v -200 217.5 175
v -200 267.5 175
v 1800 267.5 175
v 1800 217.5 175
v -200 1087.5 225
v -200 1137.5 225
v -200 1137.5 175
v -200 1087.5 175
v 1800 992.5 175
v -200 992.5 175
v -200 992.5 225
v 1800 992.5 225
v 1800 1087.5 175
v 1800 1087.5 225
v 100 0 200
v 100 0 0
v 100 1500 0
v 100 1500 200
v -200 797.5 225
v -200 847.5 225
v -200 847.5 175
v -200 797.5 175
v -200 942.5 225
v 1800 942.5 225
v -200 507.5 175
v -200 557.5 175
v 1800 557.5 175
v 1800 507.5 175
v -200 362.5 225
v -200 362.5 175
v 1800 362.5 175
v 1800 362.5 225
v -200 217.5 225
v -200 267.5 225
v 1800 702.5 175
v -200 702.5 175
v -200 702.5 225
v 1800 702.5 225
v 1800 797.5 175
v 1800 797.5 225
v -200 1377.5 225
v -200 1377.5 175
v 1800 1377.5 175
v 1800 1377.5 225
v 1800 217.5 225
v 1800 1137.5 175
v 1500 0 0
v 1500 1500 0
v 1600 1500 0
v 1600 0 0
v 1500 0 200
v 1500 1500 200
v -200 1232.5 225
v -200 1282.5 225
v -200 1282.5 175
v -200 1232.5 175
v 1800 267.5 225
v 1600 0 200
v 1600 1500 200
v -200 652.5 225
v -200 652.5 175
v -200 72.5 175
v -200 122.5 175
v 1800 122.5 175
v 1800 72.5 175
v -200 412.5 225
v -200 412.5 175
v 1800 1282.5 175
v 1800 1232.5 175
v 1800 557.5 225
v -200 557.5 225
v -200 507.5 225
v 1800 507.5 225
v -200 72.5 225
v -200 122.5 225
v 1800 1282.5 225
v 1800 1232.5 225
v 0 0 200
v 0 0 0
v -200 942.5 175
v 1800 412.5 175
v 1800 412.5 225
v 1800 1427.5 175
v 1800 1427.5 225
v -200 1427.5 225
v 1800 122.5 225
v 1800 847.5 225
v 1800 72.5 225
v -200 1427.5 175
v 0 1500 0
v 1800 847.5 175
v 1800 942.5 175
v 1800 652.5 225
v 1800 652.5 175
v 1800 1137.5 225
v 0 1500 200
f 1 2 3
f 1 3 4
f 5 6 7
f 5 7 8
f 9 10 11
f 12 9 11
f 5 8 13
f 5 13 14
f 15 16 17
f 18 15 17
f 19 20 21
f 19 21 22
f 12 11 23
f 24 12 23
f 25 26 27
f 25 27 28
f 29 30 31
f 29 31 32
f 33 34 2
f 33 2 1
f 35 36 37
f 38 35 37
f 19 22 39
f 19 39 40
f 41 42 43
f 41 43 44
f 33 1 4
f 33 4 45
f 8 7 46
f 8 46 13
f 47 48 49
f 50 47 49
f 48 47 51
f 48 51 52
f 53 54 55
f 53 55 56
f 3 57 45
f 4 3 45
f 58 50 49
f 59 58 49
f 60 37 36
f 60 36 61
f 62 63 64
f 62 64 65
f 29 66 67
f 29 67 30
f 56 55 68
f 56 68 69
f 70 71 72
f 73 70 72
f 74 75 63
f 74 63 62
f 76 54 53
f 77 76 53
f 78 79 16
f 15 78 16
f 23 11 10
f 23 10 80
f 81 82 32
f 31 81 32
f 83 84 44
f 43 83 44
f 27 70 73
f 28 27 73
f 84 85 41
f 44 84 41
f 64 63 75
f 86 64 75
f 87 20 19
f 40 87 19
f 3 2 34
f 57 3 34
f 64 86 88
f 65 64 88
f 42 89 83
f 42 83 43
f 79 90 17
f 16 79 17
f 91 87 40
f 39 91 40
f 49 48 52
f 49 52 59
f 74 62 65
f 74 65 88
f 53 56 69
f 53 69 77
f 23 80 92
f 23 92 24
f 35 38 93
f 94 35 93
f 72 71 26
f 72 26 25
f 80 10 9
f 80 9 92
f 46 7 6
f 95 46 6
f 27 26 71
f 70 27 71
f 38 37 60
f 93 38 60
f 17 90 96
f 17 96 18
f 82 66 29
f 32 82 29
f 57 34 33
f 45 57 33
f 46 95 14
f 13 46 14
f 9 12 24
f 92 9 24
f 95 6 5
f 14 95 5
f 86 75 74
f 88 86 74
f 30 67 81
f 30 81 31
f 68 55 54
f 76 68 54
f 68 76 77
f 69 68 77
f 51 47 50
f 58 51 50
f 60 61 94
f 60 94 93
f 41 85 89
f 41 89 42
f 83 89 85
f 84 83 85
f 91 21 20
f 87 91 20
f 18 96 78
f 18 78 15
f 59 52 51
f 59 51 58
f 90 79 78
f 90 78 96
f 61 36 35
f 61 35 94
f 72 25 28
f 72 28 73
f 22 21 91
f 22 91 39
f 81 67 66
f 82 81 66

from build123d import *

# Parameters (mm, degrees)
F0_W     = 100
F0_H     = 1500
F1_DEPTH = 200
F3_W     = 50
F3_H     = 50
F4_DEPTH = 2000


with BuildPart() as f1:
    # F0 (on Top) → F1 (new body)
    with BuildSketch(Plane.XY):
        with Locations((50, 750)):
            Rectangle(F0_W, F0_H)
    extrude(amount=F1_DEPTH)


with BuildPart() as f1b:
    # F0 (on Top) → F1, piece 2 (new body)
    with BuildSketch(Plane.XY):
        with Locations((1550, 750)):
            Rectangle(F0_W, F0_H)
    extrude(amount=F1_DEPTH)


with BuildPart() as f4:
    # F3 (on offset) → F4 (new body)
    with BuildSketch(Plane(origin=(-200, 0, 0), x_dir=(0, -1, 0), z_dir=(-1, 0, 0))):
        with Locations((-1402.5, 200)):
            Rectangle(F3_W, F3_H)
    extrude(amount=-F4_DEPTH)


with BuildPart() as f4b:
    # F3 (on offset) → F4, piece 2 (new body)
    with BuildSketch(Plane(origin=(-200, 0, 0), x_dir=(0, -1, 0), z_dir=(-1, 0, 0))):
        with Locations((-1257.5, 200)):
            Rectangle(F3_W, F3_H)
    extrude(amount=-F4_DEPTH)


with BuildPart() as f4c:
    # F3 (on offset) → F4, piece 3 (new body)
    with BuildSketch(Plane(origin=(-200, 0, 0), x_dir=(0, -1, 0), z_dir=(-1, 0, 0))):
        with Locations((-1112.5, 200)):
            Rectangle(F3_W, F3_H)
    extrude(amount=-F4_DEPTH)


with BuildPart() as f4d:
    # F3 (on offset) → F4, piece 4 (new body)
    with BuildSketch(Plane(origin=(-200, 0, 0), x_dir=(0, -1, 0), z_dir=(-1, 0, 0))):
        with Locations((-967.5, 200)):
            Rectangle(F3_W, F3_H)
    extrude(amount=-F4_DEPTH)


with BuildPart() as f4e:
    # F3 (on offset) → F4, piece 5 (new body)
    with BuildSketch(Plane(origin=(-200, 0, 0), x_dir=(0, -1, 0), z_dir=(-1, 0, 0))):
        with Locations((-822.5, 200)):
            Rectangle(F3_W, F3_H)
    extrude(amount=-F4_DEPTH)


with BuildPart() as f4f:
    # F3 (on offset) → F4, piece 6 (new body)
    with BuildSketch(Plane(origin=(-200, 0, 0), x_dir=(0, -1, 0), z_dir=(-1, 0, 0))):
        with Locations((-677.5, 200)):
            Rectangle(F3_W, F3_H)
    extrude(amount=-F4_DEPTH)


with BuildPart() as f4g:
    # F3 (on offset) → F4, piece 7 (new body)
    with BuildSketch(Plane(origin=(-200, 0, 0), x_dir=(0, -1, 0), z_dir=(-1, 0, 0))):
        with Locations((-532.5, 200)):
            Rectangle(F3_W, F3_H)
    extrude(amount=-F4_DEPTH)


with BuildPart() as f4h:
    # F3 (on offset) → F4, piece 8 (new body)
    with BuildSketch(Plane(origin=(-200, 0, 0), x_dir=(0, -1, 0), z_dir=(-1, 0, 0))):
        with Locations((-387.5, 200)):
            Rectangle(F3_W, F3_H)
    extrude(amount=-F4_DEPTH)


with BuildPart() as f4i:
    # F3 (on offset) → F4, piece 9 (new body)
    with BuildSketch(Plane(origin=(-200, 0, 0), x_dir=(0, -1, 0), z_dir=(-1, 0, 0))):
        with Locations((-242.5, 200)):
            Rectangle(F3_W, F3_H)
    extrude(amount=-F4_DEPTH)


with BuildPart() as f4j:
    # F3 (on offset) → F4, piece 10 (new body)
    with BuildSketch(Plane(origin=(-200, 0, 0), x_dir=(0, -1, 0), z_dir=(-1, 0, 0))):
        with Locations((-97.5, 200)):
            Rectangle(F3_W, F3_H)
    extrude(amount=-F4_DEPTH)


solid = Compound([f1.part, f1b.part, f4.part, f4b.part, f4c.part, f4d.part, f4e.part, f4f.part, f4g.part, f4h.part, f4i.part, f4j.part])
